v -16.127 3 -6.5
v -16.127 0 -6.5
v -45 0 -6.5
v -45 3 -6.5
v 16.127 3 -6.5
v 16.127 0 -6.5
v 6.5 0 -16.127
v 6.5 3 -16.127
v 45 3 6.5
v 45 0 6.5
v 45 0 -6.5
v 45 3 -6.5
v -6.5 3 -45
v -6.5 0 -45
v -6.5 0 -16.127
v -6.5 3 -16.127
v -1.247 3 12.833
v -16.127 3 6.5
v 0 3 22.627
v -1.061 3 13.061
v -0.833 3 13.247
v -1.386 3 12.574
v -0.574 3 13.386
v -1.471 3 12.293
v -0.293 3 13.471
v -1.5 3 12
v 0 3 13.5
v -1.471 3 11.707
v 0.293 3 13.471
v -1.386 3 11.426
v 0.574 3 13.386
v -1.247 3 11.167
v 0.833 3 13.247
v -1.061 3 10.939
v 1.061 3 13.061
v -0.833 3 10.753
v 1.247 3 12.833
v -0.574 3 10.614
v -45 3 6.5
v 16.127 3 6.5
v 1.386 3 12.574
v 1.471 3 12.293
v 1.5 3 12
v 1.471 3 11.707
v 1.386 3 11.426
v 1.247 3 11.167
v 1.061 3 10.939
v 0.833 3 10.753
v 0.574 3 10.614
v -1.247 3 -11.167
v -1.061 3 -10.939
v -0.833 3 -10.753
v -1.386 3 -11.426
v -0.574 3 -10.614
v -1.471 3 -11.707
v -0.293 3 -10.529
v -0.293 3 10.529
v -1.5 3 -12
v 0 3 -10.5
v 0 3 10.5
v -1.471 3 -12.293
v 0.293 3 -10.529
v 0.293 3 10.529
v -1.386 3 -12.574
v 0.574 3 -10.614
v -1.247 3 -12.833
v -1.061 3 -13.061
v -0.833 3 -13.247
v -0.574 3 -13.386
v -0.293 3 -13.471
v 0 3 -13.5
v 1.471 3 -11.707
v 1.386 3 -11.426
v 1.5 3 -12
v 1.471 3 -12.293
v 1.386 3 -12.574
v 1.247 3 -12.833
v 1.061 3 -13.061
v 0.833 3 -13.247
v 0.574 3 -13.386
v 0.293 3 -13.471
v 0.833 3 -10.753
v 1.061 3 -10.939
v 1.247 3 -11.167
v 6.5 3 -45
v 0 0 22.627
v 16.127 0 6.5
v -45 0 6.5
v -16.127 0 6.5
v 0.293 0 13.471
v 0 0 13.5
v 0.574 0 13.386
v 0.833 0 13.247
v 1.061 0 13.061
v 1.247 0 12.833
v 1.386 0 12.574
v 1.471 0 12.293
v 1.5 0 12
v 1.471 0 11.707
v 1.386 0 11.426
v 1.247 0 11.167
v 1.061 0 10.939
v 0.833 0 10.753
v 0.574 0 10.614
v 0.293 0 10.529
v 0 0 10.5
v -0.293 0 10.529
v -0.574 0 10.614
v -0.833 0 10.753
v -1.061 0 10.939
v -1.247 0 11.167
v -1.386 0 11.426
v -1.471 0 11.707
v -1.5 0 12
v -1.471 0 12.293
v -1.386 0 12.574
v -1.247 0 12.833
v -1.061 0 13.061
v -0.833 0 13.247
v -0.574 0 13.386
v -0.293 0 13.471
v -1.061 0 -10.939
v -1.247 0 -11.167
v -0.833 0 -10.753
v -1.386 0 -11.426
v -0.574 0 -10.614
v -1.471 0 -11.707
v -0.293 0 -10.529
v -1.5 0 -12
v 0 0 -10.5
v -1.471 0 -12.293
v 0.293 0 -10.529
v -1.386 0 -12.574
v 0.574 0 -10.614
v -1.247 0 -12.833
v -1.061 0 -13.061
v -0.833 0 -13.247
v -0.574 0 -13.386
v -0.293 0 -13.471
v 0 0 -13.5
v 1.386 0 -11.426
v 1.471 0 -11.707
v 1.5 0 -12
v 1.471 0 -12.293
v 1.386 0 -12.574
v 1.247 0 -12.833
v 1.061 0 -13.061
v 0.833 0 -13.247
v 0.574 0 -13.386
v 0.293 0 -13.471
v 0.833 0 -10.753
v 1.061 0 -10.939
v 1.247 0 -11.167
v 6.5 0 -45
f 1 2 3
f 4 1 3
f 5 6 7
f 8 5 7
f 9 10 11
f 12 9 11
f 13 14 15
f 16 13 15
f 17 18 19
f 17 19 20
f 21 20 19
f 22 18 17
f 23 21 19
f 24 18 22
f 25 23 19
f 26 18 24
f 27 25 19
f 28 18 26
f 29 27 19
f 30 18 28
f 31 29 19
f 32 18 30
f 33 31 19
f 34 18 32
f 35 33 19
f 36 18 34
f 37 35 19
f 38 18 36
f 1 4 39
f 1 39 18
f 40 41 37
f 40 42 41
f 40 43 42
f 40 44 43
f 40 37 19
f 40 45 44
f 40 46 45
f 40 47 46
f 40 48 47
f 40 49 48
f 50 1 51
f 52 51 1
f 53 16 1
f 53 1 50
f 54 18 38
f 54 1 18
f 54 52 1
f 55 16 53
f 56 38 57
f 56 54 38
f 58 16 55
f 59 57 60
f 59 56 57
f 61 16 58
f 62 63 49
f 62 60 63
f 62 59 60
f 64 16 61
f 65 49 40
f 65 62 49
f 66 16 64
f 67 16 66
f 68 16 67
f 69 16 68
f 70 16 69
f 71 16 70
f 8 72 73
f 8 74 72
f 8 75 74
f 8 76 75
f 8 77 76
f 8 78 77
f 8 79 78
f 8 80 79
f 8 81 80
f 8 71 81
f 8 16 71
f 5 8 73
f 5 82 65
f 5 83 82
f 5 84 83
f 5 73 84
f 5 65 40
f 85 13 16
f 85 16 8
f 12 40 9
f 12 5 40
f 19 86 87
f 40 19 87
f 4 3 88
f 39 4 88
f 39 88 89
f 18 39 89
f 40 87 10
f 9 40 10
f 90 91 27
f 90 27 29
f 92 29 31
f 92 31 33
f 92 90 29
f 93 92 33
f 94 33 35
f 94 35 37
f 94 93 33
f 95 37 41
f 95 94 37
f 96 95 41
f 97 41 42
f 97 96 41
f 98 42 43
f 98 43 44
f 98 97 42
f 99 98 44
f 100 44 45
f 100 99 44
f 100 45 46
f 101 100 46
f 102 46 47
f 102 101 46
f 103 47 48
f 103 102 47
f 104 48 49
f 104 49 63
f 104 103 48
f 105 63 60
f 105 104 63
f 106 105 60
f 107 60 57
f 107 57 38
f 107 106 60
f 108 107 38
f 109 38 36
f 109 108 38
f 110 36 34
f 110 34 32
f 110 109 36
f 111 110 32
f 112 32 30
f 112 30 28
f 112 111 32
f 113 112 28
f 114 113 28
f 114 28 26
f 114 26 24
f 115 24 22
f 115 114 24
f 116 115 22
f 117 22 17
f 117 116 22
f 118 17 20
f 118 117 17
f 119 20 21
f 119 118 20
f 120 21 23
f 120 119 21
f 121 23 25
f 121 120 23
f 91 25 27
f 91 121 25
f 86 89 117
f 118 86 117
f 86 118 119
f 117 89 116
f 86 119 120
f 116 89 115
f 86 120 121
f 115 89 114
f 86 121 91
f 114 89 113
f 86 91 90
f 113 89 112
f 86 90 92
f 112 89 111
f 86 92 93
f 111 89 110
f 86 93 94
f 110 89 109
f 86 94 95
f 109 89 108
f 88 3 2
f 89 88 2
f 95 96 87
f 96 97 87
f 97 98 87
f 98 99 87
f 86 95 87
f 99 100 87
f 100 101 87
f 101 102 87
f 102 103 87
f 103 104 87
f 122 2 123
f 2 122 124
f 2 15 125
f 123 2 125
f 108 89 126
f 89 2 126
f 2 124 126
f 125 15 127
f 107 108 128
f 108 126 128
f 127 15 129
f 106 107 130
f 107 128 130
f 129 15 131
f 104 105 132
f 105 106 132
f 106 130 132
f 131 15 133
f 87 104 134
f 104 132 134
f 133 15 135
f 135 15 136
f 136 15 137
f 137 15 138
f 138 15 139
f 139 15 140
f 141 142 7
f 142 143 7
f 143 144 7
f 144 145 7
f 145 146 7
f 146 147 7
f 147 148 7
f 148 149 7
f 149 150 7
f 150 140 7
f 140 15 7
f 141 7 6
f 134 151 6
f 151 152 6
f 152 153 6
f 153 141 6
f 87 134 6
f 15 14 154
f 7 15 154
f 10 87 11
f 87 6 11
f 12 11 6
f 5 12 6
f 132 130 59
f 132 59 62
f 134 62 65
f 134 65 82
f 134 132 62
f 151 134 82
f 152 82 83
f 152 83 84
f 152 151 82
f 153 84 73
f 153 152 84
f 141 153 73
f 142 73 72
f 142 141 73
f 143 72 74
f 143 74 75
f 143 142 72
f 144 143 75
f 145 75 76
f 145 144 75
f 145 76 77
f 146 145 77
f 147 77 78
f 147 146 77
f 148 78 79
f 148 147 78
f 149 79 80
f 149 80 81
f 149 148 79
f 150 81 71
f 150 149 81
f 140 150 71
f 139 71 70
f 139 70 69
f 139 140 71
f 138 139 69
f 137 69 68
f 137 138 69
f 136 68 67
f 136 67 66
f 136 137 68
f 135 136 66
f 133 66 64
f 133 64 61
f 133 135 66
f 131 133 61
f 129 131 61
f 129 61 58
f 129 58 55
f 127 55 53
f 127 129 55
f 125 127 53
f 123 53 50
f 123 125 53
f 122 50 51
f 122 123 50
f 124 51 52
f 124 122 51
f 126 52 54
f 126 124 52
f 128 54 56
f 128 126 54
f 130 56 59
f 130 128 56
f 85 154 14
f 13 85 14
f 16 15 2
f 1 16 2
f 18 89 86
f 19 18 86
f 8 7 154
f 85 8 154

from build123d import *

# Parameters (mm, degrees)
ESBO_O1_R                = 1.5
RESSALTO_EXTRUS_O1_DEPTH = 3


with BuildPart() as part:
    # Esboço1 → Ressalto-extrusão1 (new body)
    with BuildSketch(Plane(origin=(0, 0, 0), x_dir=(1, 0, 0), z_dir=(0, 1, 0))):
        Polygon((6.5, 16.127416998), (6.5, 45), (-6.5, 45), (-6.5, 16.127416998), (-16.127416998, 6.5), (-45, 6.5), (-45, -6.5), (-16.127416998, -6.5), (0, -22.627416998), (16.127416998, -6.5), (45, -6.5), (45, 6.5), (16.127416998, 6.5), align=None)
        with Locations(Location((0, -12, 0), (0, 0, 270))):
            Circle(ESBO_O1_R, mode=Mode.SUBTRACT)
        with Locations(Location((0, 12, 0), (0, 0, 270))):
            Circle(ESBO_O1_R, mode=Mode.SUBTRACT)
    extrude(amount=RESSALTO_EXTRUS_O1_DEPTH)


solid = part.part
